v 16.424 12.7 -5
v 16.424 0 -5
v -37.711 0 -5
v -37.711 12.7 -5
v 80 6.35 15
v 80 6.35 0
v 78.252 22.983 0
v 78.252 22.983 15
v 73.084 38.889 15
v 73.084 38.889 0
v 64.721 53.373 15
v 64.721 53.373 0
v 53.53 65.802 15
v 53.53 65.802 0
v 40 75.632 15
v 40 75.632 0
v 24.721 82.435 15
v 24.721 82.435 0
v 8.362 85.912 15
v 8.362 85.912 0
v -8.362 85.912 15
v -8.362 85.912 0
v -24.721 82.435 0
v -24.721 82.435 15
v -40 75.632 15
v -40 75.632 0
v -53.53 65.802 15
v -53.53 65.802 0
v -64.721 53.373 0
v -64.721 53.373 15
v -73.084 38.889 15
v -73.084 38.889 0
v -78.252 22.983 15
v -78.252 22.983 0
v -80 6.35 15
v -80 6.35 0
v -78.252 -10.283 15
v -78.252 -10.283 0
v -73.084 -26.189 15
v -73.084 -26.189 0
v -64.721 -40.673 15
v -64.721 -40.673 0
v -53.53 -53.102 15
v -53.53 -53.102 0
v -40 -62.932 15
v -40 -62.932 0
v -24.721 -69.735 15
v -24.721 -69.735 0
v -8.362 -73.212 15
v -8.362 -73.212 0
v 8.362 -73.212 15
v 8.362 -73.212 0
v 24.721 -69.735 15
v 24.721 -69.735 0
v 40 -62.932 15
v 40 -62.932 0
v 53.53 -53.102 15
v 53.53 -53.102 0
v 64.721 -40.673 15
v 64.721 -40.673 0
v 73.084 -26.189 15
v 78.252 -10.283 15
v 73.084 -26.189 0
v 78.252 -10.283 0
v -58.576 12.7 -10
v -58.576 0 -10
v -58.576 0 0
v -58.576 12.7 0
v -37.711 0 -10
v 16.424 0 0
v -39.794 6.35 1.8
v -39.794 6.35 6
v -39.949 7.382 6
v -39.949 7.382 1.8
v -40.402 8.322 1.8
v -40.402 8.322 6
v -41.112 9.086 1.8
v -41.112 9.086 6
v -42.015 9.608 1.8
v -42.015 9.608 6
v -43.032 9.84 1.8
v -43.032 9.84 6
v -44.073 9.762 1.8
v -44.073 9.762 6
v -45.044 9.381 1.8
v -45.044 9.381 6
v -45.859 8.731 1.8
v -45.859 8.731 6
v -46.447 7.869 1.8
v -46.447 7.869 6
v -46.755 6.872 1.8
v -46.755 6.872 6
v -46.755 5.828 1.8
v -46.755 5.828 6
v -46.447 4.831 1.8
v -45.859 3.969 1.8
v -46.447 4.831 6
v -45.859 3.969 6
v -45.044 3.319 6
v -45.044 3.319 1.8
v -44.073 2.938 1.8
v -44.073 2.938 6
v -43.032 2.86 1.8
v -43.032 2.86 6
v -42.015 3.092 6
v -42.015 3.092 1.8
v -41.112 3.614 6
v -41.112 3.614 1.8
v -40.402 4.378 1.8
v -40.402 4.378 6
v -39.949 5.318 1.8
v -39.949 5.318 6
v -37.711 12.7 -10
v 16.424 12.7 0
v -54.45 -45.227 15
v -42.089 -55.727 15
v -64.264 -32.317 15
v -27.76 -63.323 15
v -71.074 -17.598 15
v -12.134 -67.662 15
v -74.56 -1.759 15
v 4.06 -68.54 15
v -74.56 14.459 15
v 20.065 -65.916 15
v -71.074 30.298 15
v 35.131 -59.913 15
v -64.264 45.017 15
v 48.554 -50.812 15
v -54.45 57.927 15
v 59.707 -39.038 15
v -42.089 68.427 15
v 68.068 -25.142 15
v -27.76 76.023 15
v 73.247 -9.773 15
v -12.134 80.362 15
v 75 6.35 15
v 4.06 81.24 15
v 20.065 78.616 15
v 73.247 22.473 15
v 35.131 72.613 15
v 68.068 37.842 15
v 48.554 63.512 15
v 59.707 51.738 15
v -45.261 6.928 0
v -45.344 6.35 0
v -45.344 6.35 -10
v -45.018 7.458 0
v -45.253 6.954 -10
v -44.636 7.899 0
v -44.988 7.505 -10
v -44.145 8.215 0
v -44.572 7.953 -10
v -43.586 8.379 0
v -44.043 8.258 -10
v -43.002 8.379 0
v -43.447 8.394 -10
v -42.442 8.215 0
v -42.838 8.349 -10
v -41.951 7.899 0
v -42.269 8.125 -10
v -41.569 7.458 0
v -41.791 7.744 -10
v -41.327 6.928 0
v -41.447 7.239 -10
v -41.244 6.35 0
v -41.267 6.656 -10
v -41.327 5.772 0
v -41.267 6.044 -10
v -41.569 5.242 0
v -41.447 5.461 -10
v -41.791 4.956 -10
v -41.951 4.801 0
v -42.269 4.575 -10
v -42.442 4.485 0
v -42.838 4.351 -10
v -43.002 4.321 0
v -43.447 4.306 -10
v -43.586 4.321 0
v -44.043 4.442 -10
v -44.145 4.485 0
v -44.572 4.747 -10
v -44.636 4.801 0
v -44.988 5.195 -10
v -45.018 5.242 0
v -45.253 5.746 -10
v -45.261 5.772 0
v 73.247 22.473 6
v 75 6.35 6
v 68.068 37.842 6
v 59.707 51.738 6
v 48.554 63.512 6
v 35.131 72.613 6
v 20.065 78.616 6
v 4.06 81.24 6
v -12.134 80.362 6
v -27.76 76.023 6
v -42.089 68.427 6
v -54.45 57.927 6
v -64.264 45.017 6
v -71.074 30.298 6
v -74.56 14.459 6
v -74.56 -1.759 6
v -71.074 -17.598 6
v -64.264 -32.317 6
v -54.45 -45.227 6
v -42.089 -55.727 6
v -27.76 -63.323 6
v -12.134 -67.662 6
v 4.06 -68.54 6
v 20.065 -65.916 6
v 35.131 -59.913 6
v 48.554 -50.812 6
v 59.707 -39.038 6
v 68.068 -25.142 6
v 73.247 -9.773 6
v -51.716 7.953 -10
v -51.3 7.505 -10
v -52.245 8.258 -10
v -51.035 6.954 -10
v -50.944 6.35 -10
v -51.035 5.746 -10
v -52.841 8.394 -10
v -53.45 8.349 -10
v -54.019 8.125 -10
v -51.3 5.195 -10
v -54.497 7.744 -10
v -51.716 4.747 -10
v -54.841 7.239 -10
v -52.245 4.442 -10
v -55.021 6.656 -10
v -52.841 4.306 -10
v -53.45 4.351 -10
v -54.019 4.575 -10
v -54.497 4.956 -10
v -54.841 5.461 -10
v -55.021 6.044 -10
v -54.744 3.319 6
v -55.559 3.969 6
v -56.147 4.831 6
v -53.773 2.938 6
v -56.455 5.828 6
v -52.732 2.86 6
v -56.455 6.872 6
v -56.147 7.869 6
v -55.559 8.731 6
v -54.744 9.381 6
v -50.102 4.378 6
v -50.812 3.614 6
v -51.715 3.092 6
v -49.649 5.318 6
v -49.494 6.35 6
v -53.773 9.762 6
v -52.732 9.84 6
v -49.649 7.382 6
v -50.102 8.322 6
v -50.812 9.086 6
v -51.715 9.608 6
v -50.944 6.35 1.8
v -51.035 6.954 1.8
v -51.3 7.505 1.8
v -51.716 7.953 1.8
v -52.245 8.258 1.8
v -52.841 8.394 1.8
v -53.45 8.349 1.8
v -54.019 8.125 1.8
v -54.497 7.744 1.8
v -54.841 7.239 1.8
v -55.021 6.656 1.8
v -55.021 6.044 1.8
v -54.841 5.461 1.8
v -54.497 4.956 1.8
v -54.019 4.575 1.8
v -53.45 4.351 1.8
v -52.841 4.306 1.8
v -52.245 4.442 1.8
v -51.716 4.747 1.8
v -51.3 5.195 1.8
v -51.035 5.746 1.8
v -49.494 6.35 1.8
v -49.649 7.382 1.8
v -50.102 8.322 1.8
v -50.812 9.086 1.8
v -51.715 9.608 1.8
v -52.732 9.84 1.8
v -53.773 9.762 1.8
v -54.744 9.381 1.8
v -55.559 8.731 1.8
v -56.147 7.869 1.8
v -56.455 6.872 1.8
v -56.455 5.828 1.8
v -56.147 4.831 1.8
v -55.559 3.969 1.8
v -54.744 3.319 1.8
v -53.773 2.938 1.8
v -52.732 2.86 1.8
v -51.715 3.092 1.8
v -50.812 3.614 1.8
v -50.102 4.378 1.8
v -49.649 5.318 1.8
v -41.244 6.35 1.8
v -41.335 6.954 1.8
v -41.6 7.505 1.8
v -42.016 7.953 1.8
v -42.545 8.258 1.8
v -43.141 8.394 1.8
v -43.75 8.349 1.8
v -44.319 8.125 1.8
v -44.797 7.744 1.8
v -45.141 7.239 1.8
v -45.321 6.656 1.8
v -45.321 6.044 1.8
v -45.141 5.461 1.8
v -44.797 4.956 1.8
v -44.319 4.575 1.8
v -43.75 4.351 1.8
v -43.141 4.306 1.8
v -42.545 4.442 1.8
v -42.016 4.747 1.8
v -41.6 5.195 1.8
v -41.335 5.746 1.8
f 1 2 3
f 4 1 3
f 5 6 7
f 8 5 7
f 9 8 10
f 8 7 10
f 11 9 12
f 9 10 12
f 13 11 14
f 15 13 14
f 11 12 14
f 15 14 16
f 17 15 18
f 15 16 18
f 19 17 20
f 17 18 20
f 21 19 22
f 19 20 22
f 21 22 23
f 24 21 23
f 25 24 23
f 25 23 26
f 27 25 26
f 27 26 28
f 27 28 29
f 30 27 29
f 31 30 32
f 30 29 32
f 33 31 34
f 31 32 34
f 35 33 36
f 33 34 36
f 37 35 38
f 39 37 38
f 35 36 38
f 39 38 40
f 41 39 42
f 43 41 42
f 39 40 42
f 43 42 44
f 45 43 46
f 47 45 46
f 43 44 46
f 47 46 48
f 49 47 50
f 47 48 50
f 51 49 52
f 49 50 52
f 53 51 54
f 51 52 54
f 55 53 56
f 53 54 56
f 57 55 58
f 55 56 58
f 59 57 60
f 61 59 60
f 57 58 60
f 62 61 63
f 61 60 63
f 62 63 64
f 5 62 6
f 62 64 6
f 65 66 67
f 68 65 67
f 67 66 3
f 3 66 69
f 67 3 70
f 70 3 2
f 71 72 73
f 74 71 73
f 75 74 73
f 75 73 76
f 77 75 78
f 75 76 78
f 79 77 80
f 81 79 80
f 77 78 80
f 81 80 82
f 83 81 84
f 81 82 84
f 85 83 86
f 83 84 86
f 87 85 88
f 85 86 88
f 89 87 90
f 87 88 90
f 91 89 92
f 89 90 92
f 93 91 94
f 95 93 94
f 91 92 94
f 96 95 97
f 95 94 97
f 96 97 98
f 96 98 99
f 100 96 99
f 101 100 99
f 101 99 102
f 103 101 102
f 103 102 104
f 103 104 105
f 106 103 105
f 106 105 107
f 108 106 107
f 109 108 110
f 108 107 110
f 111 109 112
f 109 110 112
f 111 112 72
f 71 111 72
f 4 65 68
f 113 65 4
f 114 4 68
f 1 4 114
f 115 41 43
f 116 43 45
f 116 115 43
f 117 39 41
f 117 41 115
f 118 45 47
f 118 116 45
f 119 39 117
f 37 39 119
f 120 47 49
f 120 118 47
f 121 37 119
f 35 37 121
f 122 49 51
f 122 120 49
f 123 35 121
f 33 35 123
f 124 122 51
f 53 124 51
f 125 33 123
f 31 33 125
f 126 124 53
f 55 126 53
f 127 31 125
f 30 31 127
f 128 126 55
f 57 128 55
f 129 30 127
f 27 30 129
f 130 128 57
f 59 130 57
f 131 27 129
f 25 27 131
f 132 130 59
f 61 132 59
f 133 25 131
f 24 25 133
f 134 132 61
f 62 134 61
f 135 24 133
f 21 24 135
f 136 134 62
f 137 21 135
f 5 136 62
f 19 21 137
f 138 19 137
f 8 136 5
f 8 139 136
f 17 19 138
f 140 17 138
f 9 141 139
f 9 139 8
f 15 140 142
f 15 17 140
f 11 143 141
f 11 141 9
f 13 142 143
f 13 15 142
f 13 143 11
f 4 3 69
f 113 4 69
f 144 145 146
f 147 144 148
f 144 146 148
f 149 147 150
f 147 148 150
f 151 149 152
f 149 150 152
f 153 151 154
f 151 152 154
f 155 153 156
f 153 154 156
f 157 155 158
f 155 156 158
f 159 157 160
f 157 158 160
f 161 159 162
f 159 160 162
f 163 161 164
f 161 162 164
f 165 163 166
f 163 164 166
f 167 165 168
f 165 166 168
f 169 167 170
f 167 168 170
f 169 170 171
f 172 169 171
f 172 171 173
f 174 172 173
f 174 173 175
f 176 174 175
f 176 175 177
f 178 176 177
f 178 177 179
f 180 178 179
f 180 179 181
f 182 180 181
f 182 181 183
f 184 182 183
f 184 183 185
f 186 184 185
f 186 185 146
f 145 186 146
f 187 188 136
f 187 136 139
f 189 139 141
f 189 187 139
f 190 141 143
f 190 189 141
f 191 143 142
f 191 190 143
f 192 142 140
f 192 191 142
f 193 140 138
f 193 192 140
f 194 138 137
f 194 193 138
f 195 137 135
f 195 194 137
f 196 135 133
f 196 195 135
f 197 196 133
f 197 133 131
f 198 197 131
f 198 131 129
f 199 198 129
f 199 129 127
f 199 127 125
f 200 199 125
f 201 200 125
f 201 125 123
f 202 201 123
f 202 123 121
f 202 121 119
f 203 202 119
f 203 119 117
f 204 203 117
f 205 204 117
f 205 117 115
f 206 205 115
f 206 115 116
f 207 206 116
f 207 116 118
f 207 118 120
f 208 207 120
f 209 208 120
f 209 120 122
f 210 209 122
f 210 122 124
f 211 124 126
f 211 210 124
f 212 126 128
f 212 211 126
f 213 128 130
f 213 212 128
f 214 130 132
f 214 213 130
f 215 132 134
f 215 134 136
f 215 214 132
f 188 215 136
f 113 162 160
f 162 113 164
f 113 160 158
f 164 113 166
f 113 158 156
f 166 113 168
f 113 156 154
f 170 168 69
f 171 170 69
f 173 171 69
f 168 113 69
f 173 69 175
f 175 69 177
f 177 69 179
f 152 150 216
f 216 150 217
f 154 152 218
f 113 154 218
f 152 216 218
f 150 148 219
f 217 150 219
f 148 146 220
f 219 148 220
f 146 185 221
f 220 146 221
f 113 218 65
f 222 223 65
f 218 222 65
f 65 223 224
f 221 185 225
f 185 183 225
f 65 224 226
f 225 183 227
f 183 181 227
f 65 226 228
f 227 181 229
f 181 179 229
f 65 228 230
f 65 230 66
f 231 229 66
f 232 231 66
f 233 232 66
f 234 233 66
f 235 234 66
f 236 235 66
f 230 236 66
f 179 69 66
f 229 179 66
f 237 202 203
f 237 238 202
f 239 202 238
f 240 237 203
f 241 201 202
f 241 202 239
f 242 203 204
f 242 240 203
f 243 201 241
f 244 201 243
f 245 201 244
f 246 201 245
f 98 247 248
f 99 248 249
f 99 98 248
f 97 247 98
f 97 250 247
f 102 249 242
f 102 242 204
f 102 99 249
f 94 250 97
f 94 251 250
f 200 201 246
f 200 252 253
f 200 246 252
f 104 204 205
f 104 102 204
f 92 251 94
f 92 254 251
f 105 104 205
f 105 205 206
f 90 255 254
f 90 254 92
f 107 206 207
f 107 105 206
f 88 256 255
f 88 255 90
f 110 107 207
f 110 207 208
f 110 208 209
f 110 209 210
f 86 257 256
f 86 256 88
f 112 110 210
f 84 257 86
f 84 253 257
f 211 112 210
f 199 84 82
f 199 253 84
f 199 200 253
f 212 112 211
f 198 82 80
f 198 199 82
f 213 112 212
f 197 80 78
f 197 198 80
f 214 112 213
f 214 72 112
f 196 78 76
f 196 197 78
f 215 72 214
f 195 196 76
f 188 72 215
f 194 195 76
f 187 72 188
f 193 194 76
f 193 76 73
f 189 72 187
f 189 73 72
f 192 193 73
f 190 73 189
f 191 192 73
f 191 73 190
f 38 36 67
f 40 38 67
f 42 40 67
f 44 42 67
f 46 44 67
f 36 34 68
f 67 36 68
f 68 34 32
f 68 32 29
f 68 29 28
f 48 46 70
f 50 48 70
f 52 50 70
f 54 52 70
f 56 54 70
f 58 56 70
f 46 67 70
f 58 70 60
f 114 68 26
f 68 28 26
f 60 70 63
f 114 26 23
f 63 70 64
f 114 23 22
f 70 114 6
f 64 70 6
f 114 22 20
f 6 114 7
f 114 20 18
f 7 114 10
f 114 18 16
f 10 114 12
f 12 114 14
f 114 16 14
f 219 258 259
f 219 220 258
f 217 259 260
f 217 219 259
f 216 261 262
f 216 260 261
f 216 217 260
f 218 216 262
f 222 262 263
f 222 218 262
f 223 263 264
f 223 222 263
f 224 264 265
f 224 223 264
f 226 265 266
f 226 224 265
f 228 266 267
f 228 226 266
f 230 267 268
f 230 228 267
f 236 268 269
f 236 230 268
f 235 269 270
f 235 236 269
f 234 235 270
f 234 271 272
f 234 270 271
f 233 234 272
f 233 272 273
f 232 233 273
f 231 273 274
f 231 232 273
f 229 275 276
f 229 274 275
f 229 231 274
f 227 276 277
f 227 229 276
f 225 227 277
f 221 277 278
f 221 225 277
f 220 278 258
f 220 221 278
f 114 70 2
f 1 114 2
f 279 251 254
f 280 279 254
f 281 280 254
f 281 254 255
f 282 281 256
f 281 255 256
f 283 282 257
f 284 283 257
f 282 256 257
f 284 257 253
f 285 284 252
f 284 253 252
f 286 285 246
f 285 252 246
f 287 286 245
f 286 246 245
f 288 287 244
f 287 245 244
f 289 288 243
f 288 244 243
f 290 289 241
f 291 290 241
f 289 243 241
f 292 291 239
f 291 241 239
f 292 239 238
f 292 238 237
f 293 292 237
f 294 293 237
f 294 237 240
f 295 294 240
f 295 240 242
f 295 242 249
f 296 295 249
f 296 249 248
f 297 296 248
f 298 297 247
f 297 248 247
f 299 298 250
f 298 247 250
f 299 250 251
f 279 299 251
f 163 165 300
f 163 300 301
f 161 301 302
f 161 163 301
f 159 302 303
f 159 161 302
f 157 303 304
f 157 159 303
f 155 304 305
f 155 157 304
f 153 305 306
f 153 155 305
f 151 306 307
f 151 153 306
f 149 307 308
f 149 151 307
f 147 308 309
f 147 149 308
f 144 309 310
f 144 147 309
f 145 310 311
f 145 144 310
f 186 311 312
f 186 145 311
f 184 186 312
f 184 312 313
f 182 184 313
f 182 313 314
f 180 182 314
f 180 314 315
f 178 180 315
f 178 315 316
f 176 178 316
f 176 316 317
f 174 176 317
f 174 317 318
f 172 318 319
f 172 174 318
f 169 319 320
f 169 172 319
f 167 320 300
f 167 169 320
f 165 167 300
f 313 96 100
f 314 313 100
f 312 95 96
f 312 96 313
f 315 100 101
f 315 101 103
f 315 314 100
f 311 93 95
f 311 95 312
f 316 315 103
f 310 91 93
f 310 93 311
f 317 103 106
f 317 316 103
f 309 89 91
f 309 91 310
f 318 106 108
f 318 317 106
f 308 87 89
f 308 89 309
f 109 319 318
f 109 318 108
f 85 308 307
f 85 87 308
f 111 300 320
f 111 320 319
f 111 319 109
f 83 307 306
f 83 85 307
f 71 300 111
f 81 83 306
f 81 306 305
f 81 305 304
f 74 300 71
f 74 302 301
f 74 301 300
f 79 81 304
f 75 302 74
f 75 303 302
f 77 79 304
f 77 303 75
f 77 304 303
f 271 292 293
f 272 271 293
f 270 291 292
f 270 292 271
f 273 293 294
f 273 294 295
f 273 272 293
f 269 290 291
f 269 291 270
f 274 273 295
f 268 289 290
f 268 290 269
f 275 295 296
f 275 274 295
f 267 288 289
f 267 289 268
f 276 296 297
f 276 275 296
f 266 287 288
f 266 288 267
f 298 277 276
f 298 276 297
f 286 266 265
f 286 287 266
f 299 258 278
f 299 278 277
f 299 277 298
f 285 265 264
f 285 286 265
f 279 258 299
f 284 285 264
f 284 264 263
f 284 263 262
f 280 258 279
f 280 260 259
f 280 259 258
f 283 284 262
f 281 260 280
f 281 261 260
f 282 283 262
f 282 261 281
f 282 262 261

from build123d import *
from build123d.topology import SkipClean

# Parameters (mm, degrees)
BOSS_EXTRUDE1_DEPTH = 12.7
SKETCH2_R           = 2.05
CUT_EXTRUDE1_DEPTH  = 12.7
SKETCH3_R           = 75
SKETCH3_R_2         = 2.05
BOSS_EXTRUDE2_DEPTH = 6
SKETCH3_4_R         = 80
SKETCH3_4_R_2       = 75
BOSS_EXTRUDE3_DEPTH = 15
SKETCH4_R           = 3.5
CUT_EXTRUDE2_DEPTH  = 4.2


with BuildPart() as part:
    # Sketch1 → Boss-Extrude1 (new body)
    with BuildSketch(Plane(origin=(0, 0, 0), x_dir=(1, 0, 0), z_dir=(0, 1, 0))):
        Polygon((-58.57612782, 0), (16.42387218, 0), (16.42387218, 5), (-37.711466165, 5), (-37.711466165, 10), (-58.57612782, 10), align=None)
    extrude(amount=BOSS_EXTRUDE1_DEPTH)

    # Sketch2 → Cut-Extrude1 (cut)
    with BuildSketch(Plane(origin=(0, 0, -10), x_dir=(-1, 0, 0), z_dir=(0, 0, -1))):
        with Locations((43.293796992, 6.35)):
            Circle(SKETCH2_R)
        with Locations((52.993796992, 6.35)):
            Circle(SKETCH2_R)
    extrude(amount=-CUT_EXTRUDE1_DEPTH, mode=Mode.SUBTRACT)

    # Sketch3 → Boss-Extrude2 (add)
    with SkipClean():  # the faces are left unmerged after this step: merging them gives an invalid solid
        with BuildSketch(Plane.XY):
            with Locations((0, 6.35)):
                Circle(SKETCH3_R)
            with Locations((-52.993796992, 6.35)):
                Circle(SKETCH3_R_2, mode=Mode.SUBTRACT)
            with Locations((-43.293796992, 6.35)):
                Circle(SKETCH3_R_2, mode=Mode.SUBTRACT)
        extrude(amount=BOSS_EXTRUDE2_DEPTH)

    # Sketch3<4> → Boss-Extrude3 (add)
    with SkipClean():  # the faces are left unmerged after this step: merging them gives an invalid solid
        with BuildSketch(Plane.XY):
            with Locations((0, 6.35)):
                Circle(SKETCH3_4_R)
            with Locations((0, 6.35)):
                Circle(SKETCH3_4_R_2, mode=Mode.SUBTRACT)
        extrude(amount=BOSS_EXTRUDE3_DEPTH)

    # Sketch4 → Cut-Extrude2 (cut)
    with SkipClean():  # the faces are left unmerged after this step: merging them gives an invalid solid
        with BuildSketch(Plane.XY.offset(6)):
            with Locations((-52.993796992, 6.35)):
                Circle(SKETCH4_R)
            with Locations((-43.293796992, 6.35)):
                Circle(SKETCH4_R)
        extrude(amount=-CUT_EXTRUDE2_DEPTH, mode=Mode.SUBTRACT)


solid = part.part
